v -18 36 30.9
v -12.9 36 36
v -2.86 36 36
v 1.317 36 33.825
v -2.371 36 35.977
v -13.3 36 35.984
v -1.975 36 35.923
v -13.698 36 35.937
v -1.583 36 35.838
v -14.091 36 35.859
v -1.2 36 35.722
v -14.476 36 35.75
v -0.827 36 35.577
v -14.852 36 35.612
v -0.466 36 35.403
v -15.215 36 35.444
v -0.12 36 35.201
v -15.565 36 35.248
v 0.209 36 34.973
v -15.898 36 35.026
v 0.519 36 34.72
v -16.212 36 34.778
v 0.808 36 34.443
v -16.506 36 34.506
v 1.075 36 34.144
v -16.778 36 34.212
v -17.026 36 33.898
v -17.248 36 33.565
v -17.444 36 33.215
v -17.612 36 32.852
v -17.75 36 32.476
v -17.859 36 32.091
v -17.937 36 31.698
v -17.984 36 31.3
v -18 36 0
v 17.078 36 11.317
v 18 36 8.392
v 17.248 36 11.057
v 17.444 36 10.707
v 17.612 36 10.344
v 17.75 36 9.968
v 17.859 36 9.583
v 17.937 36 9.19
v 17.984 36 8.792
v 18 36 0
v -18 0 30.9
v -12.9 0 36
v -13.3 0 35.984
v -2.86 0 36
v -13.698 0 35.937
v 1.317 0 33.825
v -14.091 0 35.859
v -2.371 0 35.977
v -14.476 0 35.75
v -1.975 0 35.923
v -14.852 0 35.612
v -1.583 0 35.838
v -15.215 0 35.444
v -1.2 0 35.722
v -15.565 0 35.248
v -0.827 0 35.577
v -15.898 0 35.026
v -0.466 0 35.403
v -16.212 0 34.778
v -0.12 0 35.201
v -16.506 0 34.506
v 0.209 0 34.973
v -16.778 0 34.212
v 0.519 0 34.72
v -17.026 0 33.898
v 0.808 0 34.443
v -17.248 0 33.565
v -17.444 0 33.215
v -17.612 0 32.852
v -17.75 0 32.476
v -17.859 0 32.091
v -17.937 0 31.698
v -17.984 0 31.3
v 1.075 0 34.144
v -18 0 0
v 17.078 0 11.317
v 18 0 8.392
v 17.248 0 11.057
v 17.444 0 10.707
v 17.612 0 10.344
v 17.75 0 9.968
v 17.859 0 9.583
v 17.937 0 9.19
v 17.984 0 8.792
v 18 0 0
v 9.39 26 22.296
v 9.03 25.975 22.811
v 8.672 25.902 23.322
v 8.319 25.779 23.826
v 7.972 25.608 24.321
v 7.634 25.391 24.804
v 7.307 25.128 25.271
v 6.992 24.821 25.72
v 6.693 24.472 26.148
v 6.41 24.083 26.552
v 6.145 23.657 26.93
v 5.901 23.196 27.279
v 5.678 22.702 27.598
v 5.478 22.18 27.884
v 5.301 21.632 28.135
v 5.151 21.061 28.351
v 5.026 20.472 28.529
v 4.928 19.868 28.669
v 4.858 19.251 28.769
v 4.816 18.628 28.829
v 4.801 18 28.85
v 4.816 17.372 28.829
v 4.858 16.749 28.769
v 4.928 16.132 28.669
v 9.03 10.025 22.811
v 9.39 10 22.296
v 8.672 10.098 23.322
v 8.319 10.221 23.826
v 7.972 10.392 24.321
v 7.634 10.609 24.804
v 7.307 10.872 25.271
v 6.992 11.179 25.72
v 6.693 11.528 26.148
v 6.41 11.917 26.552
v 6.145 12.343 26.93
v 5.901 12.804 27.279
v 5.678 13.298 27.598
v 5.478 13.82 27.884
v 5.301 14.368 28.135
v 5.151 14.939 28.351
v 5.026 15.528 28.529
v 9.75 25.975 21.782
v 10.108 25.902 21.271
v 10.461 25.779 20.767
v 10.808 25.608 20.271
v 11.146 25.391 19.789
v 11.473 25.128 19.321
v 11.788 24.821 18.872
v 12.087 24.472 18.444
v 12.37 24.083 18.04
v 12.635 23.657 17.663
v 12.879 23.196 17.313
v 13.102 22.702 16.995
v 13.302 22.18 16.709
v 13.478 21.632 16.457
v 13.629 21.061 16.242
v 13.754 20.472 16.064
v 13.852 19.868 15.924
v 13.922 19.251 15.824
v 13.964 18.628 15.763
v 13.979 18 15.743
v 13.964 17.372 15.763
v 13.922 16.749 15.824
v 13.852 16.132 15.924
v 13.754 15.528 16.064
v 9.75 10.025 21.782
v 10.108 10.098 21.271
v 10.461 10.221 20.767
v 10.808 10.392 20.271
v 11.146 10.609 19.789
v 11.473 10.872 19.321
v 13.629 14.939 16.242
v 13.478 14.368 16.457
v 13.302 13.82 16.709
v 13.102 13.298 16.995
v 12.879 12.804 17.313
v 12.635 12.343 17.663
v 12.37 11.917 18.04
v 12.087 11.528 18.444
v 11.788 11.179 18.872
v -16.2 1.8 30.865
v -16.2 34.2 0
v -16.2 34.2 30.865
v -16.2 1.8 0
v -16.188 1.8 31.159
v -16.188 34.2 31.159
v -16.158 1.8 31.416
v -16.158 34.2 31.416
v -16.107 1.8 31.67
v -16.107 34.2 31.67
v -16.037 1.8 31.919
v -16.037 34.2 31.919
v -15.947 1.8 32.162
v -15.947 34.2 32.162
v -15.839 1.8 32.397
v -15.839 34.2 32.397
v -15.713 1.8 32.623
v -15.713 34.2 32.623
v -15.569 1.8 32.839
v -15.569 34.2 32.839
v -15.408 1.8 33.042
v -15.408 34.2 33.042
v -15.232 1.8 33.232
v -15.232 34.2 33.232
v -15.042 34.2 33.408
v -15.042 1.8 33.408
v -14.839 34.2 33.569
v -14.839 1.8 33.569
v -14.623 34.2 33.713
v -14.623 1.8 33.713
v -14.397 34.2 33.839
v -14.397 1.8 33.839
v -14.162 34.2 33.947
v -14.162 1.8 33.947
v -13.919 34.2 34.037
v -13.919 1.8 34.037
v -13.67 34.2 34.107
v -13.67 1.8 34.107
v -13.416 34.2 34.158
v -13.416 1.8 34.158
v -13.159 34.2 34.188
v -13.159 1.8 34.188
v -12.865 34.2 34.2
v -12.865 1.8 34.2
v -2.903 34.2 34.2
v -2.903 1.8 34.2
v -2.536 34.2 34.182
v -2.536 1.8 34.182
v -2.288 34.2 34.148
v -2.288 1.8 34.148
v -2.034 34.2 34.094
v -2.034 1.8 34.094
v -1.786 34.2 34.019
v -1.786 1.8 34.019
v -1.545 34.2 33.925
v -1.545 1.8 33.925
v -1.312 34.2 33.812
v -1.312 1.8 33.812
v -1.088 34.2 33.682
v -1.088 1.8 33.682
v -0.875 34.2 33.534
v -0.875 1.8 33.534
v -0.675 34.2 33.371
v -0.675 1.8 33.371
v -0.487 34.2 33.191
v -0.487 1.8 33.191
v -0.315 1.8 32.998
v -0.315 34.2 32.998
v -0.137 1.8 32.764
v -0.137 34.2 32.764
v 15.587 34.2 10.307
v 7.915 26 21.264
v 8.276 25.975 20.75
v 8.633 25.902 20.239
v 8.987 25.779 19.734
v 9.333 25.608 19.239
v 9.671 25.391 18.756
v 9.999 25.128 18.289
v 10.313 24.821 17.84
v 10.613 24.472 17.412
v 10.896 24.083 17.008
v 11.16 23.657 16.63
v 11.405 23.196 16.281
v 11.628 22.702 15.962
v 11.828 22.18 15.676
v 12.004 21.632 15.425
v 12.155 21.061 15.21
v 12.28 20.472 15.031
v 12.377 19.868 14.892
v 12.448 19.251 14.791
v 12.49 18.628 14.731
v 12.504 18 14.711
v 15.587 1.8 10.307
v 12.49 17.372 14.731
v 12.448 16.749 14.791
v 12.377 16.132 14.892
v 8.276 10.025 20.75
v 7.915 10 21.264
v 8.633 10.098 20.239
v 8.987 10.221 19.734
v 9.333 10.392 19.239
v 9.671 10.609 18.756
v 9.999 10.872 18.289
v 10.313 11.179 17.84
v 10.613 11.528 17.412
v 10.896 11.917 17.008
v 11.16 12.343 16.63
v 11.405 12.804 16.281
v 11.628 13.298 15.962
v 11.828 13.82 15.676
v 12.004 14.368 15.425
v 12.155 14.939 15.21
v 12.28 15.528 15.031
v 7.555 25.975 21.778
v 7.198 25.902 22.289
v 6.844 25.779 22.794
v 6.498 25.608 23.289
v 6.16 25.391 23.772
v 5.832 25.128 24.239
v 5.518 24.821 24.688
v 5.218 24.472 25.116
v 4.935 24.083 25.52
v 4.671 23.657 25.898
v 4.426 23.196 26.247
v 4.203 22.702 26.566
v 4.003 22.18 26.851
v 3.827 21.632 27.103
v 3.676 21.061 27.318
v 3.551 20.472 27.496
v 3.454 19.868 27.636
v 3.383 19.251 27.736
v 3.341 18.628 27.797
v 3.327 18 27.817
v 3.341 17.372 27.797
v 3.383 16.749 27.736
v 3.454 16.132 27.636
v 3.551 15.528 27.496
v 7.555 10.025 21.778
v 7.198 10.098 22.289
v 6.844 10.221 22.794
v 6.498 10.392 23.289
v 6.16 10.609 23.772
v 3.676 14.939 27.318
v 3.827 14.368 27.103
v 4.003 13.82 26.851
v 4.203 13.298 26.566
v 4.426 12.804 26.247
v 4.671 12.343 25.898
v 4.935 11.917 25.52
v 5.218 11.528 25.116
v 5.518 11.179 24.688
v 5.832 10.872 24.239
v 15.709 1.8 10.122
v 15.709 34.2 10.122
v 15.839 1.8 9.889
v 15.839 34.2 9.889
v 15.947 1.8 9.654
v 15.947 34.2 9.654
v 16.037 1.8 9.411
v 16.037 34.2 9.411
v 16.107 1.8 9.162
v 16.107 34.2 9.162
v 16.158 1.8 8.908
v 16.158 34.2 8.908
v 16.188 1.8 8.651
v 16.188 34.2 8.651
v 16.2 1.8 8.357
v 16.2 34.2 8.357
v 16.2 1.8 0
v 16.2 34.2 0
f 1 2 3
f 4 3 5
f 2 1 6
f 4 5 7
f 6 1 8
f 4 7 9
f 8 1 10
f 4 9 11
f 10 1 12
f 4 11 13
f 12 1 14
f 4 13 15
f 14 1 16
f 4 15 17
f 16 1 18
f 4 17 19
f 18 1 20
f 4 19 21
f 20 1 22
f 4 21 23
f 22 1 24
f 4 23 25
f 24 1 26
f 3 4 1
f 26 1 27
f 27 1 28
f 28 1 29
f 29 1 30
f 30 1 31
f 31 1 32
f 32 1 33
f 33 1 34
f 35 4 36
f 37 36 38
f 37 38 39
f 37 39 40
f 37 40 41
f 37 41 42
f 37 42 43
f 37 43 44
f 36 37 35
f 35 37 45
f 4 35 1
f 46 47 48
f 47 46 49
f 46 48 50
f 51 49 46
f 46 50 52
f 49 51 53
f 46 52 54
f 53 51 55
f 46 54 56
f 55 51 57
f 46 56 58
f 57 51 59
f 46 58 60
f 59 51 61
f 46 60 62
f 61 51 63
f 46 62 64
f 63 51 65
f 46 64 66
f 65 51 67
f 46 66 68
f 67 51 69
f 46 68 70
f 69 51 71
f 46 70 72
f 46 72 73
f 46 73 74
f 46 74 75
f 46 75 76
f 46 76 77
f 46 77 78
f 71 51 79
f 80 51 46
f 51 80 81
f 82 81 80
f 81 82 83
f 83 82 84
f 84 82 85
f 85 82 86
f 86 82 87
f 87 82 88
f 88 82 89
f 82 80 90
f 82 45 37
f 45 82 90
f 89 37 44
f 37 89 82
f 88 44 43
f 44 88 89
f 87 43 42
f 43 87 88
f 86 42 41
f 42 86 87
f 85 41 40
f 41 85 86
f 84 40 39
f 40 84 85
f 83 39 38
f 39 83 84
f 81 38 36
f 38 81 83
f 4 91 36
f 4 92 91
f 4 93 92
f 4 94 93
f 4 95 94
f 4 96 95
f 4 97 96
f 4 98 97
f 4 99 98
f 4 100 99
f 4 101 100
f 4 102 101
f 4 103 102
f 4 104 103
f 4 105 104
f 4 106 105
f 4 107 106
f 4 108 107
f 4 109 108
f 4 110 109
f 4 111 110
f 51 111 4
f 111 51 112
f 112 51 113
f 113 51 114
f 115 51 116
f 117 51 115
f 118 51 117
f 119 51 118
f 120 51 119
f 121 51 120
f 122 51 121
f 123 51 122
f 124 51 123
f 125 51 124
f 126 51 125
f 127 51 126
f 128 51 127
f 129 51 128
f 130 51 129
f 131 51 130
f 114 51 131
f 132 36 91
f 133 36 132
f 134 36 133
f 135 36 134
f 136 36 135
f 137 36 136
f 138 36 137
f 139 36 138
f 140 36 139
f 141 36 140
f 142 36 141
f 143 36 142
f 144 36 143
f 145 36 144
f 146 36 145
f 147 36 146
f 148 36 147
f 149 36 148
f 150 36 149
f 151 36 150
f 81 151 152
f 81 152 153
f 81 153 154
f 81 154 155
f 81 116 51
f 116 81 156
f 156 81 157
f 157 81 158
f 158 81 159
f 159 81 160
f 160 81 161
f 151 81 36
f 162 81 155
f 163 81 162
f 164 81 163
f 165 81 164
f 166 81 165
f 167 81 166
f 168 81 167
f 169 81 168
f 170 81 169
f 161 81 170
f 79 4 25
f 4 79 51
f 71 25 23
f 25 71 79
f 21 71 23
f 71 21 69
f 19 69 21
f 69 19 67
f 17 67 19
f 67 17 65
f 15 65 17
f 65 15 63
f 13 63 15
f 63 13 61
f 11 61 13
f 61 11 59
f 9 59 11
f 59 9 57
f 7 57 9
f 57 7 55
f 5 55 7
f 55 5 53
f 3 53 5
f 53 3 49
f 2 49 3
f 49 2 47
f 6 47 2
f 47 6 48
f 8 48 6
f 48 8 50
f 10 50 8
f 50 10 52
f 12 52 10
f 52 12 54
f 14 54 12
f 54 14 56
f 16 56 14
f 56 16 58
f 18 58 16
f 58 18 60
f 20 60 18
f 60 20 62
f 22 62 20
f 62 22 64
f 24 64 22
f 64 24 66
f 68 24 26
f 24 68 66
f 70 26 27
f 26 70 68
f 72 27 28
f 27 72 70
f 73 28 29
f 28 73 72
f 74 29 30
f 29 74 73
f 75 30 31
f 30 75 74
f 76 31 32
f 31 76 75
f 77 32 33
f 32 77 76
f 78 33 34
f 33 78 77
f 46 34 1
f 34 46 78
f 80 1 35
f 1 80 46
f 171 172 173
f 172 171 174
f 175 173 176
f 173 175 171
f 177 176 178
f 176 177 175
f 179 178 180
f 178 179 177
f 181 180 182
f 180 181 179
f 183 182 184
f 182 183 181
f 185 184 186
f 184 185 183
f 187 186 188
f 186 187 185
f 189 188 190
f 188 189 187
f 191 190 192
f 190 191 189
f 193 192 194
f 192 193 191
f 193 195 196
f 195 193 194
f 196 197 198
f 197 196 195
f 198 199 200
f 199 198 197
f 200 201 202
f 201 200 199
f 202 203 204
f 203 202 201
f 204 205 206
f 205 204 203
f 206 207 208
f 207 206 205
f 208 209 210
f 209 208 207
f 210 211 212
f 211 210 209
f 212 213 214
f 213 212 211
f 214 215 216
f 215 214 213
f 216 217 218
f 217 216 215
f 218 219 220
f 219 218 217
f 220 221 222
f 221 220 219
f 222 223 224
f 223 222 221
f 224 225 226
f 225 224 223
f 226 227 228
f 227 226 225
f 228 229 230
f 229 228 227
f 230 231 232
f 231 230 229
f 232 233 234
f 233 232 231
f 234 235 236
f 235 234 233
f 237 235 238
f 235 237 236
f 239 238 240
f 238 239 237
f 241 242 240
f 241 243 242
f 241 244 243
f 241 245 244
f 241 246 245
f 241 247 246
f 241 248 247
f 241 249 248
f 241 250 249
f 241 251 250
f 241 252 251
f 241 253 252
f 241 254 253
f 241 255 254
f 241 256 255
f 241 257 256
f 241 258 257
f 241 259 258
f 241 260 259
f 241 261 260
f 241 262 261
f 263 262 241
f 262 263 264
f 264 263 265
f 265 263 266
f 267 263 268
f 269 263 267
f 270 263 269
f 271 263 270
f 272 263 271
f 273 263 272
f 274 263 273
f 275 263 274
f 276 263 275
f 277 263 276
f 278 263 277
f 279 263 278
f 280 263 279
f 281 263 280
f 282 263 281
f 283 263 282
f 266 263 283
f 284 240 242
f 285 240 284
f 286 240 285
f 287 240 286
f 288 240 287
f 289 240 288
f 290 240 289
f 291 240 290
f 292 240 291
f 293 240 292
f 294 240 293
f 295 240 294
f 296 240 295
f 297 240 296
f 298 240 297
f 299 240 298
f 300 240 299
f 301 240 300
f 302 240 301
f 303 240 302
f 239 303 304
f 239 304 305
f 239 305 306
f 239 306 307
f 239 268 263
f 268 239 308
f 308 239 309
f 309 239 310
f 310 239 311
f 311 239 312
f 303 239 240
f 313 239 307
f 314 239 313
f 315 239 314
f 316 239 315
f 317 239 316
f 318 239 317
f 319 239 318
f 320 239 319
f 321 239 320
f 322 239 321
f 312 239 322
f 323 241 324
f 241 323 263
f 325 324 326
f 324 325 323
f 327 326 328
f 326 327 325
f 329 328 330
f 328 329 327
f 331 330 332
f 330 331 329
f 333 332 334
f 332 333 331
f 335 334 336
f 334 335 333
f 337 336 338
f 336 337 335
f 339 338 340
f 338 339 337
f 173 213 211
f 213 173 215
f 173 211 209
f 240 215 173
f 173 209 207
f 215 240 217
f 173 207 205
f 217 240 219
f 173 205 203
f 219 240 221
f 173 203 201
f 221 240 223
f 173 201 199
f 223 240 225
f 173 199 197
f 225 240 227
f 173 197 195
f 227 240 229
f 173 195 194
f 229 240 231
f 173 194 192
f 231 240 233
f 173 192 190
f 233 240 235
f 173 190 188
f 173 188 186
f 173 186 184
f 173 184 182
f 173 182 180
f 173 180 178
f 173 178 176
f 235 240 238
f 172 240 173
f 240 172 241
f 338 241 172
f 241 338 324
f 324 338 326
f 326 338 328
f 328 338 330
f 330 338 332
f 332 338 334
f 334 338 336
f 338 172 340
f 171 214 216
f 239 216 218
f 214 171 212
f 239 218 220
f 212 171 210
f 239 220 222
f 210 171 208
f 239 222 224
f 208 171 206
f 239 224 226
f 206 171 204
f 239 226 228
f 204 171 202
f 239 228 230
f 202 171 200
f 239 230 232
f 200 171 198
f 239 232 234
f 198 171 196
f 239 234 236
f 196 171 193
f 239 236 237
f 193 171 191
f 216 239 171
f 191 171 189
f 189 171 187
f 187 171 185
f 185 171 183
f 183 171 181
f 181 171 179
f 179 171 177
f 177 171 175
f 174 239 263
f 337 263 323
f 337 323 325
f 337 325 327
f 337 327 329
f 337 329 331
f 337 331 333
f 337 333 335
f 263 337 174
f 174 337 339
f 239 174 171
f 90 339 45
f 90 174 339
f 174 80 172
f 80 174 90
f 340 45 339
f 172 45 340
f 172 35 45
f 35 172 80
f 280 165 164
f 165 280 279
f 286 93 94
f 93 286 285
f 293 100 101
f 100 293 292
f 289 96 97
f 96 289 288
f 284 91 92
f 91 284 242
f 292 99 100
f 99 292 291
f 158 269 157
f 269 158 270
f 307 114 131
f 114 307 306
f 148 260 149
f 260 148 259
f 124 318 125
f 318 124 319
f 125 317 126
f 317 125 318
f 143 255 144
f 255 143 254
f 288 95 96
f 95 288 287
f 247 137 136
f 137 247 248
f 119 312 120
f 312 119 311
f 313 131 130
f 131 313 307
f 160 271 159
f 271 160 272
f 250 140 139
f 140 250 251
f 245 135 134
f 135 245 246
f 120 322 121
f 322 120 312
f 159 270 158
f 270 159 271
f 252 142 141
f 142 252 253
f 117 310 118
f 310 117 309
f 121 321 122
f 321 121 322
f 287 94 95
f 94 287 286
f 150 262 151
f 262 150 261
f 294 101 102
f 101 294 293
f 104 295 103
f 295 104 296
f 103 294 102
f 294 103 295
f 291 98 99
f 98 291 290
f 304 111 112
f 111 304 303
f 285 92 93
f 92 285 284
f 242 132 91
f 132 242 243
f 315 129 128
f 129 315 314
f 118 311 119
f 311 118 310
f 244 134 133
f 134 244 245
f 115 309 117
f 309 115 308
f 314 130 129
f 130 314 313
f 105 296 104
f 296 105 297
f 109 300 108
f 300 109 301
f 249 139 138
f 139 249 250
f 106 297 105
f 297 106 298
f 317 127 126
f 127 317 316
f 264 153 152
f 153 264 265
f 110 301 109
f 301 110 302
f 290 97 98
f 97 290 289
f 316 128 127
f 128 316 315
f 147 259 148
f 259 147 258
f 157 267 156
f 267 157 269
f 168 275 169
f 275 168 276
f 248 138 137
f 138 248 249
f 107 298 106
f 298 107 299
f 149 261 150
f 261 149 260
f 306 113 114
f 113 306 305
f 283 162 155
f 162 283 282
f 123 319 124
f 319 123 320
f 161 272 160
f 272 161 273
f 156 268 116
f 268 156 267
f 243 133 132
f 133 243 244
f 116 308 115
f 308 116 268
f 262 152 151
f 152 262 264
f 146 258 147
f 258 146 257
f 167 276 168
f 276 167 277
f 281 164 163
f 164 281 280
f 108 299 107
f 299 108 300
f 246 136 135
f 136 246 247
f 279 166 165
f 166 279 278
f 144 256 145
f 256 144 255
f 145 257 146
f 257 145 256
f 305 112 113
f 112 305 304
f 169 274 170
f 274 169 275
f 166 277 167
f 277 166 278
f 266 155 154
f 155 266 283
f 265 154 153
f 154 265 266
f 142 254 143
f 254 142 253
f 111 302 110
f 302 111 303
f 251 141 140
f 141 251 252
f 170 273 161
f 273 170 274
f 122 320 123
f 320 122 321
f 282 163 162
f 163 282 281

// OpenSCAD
hole_dia=16;
size=36;//size of cube to house button
front_flat=10;
slope=35;
wall_thickness=1.8;
button_num=1;

dotext=0; // 1=yes or 0=no .... please note will take more time to render if yes

/*[Custom text for up to 4 buttons]*/
button_1_text="START";
button_2_text="SW-2";
button_3_text="SW-3";
button_4_text="SW-4";


button_text = [
   [0,  button_1_text],
   [1,  button_2_text],
   [2,  button_3_text],
   [3,  button_4_text],
    ];


 
module profile(){
round2d(5.1,0){
difference(){
translate([0,-10,0]) square([size,size+10]);
translate([size,front_flat,-0.2]) rotate([0,0,slope]) square(size+5,size);
}
}
}

$fn=80;
 

module round2d(OR,IR){
    offset(OR)offset(-IR-OR)offset(IR)children();
}

module side(){
linear_extrude(height=wall_thickness) profile();
}


module wall(){
    difference(){
     profile();
offset(r = -wall_thickness) profile();
    }
}

module boxy() {
linear_extrude(height=size) wall();
side();
translate([0,0,size-wall_thickness]) side();
}

module housing(){
render(convexity = 1){
difference(){
boxy();
translate([0,-size*3/2,0]) cube([size*3,size*3,size*3],true);
}}
}

module body_with_hole (){
     render(convexity = 1){
    difference(){
translate([0,size*sin(slope)-front_flat*cos(slope)-(size-front_flat)/cos(30)/2,-size/2]) rotate([0,0,-slope]) housing();
translate([size*cos(slope)-wall_thickness,0,0]) rotate([0,90,0]) cylinder(  15, d1=hole_dia,  d2=hole_dia);
    }
    
}

}


module turn_body_with_hole (){
    translate([-size/2,size/2,0])
  rotate([90,0,0]){  
ken=-(size*sin(slope)-front_flat*cos(slope)-(size-front_flat)/cos(30)/2);
echo (ken);
rotate([0,0,slope])
translate([0,ken,size/2]) body_with_hole();
  }
}



module all(){
for (a =[1:1:button_num])
translate([0,-size/2+wall_thickness,0])    
translate([0,a*size-(a*wall_thickness),0]) turn_body_with_hole ();
}




module button_name (){
for (a = button_text){
    translate([0,size*a[0]-(a[0]*wall_thickness),0]) 
    translate([size/2,size/2,front_flat*0.2]) 
    rotate([90,0,90])
    linear_extrude(height=20)
    text(text = str(a[1]),size=front_flat*0.5,halign="center");
}
}
render(convexity = 1){
difference(){
all();
if (dotext==1) translate([-wall_thickness/2,0,0]) button_name ();
     }
}
